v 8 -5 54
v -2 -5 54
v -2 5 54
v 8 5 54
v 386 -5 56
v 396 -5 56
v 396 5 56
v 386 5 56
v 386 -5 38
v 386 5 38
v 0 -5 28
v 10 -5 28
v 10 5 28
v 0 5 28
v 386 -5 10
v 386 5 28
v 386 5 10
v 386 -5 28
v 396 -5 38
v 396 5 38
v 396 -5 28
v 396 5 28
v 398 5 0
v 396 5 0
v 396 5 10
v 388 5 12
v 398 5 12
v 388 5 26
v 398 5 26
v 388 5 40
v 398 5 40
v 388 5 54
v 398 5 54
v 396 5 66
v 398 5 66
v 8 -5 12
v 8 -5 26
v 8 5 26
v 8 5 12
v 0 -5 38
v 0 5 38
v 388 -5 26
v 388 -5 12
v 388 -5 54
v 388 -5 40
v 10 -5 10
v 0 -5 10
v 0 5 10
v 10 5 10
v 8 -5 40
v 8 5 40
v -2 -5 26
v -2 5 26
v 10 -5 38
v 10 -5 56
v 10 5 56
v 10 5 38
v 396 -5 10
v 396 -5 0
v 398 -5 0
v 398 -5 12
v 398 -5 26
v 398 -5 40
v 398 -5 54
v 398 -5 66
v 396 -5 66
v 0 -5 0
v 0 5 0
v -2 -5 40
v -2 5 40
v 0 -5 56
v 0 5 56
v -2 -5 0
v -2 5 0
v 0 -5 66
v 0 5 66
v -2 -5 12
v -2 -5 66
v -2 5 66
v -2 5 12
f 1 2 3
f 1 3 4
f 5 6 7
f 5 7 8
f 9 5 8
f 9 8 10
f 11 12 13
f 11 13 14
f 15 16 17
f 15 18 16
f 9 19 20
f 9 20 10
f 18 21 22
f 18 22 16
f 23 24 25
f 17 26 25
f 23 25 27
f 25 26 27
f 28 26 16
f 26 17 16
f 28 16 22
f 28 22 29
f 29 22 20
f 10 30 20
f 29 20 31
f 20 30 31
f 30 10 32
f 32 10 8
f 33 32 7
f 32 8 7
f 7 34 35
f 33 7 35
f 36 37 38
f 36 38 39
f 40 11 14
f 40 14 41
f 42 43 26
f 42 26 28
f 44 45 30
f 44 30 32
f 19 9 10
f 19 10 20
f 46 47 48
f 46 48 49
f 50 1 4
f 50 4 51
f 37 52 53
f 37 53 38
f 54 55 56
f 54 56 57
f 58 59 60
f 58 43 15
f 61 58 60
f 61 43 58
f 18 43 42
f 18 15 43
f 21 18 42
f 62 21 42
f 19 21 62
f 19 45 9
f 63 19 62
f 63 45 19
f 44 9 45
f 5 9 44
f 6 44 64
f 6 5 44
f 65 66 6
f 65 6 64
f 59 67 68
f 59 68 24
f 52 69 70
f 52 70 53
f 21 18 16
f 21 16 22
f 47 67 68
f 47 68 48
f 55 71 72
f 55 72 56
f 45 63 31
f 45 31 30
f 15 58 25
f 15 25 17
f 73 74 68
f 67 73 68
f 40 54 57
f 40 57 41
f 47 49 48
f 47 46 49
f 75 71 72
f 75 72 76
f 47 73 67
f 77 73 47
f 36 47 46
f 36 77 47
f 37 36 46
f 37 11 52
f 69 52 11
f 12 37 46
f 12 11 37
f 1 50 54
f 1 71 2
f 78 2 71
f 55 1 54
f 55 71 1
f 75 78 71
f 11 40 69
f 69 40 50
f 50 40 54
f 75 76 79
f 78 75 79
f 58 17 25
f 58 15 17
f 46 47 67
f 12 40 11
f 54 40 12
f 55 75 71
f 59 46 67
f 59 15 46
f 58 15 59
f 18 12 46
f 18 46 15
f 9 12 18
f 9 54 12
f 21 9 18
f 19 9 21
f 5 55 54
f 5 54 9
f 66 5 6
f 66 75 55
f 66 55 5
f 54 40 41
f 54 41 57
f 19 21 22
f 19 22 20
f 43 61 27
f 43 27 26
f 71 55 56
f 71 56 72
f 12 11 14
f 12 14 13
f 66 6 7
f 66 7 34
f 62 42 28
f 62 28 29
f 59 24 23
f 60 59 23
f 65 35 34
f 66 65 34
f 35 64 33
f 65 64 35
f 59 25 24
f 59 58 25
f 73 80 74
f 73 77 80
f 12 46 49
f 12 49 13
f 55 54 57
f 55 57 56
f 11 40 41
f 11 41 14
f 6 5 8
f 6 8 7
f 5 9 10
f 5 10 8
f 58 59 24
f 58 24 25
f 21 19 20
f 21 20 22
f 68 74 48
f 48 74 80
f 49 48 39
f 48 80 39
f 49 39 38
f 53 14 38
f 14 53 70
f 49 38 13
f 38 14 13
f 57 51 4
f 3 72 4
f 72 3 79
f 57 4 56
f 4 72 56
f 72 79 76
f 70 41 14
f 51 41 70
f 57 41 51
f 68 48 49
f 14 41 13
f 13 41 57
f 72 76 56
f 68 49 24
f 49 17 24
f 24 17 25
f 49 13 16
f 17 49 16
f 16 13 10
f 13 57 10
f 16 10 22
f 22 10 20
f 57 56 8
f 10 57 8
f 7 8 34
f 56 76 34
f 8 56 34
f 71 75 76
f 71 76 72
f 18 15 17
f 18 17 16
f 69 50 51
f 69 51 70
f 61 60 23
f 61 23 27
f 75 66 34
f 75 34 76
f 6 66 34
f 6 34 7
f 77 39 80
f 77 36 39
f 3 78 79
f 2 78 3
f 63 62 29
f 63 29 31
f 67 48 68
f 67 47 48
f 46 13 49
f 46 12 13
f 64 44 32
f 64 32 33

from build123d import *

# Parameters (mm, degrees)
F2_DEPTH = 5
F3_DEPTH = 5


with BuildPart() as f2:
    # F1 (on Front) → F2 (new body, symmetric)
    with BuildSketch(Plane.XZ):
        Polygon((0, 10), (0, 0), (198, 0), (396, 0), (396, 10), (386, 10), (386, 28), (396, 28), (396, 38), (386, 38), (386, 56), (396, 56), (396, 66), (198, 66), (0, 66), (0, 56), (10, 56), (10, 38), (0, 38), (0, 28), (10, 28), (10, 10), align=None)
    extrude(amount=F2_DEPTH, both=True)


with BuildPart() as f3:
    # F1 (on Front) → F3 (new body, symmetric)
    with BuildSketch(Plane.XZ):
        Polygon((-2, 0), (0, 0), (0, 10), (10, 10), (10, 28), (0, 28), (0, 38), (10, 38), (10, 56), (0, 56), (0, 66), (-2, 66), (-2, 54), (8, 54), (8, 40), (-2, 40), (-2, 26), (8, 26), (8, 12), (-2, 12), align=None)
    extrude(amount=F3_DEPTH, both=True)


with BuildPart() as f3b:
    # F1 (on Front) → F3, piece 2 (new body, symmetric)
    with BuildSketch(Plane.XZ):
        Polygon((396, 10), (396, 0), (398, 0), (398, 12), (388, 12), (388, 26), (398, 26), (398, 40), (388, 40), (388, 54), (398, 54), (398, 66), (396, 66), (396, 56), (386, 56), (386, 38), (396, 38), (396, 28), (386, 28), (386, 10), align=None)
    extrude(amount=F3_DEPTH, both=True)


solid = Compound([f2.part, f3.part, f3b.part])
